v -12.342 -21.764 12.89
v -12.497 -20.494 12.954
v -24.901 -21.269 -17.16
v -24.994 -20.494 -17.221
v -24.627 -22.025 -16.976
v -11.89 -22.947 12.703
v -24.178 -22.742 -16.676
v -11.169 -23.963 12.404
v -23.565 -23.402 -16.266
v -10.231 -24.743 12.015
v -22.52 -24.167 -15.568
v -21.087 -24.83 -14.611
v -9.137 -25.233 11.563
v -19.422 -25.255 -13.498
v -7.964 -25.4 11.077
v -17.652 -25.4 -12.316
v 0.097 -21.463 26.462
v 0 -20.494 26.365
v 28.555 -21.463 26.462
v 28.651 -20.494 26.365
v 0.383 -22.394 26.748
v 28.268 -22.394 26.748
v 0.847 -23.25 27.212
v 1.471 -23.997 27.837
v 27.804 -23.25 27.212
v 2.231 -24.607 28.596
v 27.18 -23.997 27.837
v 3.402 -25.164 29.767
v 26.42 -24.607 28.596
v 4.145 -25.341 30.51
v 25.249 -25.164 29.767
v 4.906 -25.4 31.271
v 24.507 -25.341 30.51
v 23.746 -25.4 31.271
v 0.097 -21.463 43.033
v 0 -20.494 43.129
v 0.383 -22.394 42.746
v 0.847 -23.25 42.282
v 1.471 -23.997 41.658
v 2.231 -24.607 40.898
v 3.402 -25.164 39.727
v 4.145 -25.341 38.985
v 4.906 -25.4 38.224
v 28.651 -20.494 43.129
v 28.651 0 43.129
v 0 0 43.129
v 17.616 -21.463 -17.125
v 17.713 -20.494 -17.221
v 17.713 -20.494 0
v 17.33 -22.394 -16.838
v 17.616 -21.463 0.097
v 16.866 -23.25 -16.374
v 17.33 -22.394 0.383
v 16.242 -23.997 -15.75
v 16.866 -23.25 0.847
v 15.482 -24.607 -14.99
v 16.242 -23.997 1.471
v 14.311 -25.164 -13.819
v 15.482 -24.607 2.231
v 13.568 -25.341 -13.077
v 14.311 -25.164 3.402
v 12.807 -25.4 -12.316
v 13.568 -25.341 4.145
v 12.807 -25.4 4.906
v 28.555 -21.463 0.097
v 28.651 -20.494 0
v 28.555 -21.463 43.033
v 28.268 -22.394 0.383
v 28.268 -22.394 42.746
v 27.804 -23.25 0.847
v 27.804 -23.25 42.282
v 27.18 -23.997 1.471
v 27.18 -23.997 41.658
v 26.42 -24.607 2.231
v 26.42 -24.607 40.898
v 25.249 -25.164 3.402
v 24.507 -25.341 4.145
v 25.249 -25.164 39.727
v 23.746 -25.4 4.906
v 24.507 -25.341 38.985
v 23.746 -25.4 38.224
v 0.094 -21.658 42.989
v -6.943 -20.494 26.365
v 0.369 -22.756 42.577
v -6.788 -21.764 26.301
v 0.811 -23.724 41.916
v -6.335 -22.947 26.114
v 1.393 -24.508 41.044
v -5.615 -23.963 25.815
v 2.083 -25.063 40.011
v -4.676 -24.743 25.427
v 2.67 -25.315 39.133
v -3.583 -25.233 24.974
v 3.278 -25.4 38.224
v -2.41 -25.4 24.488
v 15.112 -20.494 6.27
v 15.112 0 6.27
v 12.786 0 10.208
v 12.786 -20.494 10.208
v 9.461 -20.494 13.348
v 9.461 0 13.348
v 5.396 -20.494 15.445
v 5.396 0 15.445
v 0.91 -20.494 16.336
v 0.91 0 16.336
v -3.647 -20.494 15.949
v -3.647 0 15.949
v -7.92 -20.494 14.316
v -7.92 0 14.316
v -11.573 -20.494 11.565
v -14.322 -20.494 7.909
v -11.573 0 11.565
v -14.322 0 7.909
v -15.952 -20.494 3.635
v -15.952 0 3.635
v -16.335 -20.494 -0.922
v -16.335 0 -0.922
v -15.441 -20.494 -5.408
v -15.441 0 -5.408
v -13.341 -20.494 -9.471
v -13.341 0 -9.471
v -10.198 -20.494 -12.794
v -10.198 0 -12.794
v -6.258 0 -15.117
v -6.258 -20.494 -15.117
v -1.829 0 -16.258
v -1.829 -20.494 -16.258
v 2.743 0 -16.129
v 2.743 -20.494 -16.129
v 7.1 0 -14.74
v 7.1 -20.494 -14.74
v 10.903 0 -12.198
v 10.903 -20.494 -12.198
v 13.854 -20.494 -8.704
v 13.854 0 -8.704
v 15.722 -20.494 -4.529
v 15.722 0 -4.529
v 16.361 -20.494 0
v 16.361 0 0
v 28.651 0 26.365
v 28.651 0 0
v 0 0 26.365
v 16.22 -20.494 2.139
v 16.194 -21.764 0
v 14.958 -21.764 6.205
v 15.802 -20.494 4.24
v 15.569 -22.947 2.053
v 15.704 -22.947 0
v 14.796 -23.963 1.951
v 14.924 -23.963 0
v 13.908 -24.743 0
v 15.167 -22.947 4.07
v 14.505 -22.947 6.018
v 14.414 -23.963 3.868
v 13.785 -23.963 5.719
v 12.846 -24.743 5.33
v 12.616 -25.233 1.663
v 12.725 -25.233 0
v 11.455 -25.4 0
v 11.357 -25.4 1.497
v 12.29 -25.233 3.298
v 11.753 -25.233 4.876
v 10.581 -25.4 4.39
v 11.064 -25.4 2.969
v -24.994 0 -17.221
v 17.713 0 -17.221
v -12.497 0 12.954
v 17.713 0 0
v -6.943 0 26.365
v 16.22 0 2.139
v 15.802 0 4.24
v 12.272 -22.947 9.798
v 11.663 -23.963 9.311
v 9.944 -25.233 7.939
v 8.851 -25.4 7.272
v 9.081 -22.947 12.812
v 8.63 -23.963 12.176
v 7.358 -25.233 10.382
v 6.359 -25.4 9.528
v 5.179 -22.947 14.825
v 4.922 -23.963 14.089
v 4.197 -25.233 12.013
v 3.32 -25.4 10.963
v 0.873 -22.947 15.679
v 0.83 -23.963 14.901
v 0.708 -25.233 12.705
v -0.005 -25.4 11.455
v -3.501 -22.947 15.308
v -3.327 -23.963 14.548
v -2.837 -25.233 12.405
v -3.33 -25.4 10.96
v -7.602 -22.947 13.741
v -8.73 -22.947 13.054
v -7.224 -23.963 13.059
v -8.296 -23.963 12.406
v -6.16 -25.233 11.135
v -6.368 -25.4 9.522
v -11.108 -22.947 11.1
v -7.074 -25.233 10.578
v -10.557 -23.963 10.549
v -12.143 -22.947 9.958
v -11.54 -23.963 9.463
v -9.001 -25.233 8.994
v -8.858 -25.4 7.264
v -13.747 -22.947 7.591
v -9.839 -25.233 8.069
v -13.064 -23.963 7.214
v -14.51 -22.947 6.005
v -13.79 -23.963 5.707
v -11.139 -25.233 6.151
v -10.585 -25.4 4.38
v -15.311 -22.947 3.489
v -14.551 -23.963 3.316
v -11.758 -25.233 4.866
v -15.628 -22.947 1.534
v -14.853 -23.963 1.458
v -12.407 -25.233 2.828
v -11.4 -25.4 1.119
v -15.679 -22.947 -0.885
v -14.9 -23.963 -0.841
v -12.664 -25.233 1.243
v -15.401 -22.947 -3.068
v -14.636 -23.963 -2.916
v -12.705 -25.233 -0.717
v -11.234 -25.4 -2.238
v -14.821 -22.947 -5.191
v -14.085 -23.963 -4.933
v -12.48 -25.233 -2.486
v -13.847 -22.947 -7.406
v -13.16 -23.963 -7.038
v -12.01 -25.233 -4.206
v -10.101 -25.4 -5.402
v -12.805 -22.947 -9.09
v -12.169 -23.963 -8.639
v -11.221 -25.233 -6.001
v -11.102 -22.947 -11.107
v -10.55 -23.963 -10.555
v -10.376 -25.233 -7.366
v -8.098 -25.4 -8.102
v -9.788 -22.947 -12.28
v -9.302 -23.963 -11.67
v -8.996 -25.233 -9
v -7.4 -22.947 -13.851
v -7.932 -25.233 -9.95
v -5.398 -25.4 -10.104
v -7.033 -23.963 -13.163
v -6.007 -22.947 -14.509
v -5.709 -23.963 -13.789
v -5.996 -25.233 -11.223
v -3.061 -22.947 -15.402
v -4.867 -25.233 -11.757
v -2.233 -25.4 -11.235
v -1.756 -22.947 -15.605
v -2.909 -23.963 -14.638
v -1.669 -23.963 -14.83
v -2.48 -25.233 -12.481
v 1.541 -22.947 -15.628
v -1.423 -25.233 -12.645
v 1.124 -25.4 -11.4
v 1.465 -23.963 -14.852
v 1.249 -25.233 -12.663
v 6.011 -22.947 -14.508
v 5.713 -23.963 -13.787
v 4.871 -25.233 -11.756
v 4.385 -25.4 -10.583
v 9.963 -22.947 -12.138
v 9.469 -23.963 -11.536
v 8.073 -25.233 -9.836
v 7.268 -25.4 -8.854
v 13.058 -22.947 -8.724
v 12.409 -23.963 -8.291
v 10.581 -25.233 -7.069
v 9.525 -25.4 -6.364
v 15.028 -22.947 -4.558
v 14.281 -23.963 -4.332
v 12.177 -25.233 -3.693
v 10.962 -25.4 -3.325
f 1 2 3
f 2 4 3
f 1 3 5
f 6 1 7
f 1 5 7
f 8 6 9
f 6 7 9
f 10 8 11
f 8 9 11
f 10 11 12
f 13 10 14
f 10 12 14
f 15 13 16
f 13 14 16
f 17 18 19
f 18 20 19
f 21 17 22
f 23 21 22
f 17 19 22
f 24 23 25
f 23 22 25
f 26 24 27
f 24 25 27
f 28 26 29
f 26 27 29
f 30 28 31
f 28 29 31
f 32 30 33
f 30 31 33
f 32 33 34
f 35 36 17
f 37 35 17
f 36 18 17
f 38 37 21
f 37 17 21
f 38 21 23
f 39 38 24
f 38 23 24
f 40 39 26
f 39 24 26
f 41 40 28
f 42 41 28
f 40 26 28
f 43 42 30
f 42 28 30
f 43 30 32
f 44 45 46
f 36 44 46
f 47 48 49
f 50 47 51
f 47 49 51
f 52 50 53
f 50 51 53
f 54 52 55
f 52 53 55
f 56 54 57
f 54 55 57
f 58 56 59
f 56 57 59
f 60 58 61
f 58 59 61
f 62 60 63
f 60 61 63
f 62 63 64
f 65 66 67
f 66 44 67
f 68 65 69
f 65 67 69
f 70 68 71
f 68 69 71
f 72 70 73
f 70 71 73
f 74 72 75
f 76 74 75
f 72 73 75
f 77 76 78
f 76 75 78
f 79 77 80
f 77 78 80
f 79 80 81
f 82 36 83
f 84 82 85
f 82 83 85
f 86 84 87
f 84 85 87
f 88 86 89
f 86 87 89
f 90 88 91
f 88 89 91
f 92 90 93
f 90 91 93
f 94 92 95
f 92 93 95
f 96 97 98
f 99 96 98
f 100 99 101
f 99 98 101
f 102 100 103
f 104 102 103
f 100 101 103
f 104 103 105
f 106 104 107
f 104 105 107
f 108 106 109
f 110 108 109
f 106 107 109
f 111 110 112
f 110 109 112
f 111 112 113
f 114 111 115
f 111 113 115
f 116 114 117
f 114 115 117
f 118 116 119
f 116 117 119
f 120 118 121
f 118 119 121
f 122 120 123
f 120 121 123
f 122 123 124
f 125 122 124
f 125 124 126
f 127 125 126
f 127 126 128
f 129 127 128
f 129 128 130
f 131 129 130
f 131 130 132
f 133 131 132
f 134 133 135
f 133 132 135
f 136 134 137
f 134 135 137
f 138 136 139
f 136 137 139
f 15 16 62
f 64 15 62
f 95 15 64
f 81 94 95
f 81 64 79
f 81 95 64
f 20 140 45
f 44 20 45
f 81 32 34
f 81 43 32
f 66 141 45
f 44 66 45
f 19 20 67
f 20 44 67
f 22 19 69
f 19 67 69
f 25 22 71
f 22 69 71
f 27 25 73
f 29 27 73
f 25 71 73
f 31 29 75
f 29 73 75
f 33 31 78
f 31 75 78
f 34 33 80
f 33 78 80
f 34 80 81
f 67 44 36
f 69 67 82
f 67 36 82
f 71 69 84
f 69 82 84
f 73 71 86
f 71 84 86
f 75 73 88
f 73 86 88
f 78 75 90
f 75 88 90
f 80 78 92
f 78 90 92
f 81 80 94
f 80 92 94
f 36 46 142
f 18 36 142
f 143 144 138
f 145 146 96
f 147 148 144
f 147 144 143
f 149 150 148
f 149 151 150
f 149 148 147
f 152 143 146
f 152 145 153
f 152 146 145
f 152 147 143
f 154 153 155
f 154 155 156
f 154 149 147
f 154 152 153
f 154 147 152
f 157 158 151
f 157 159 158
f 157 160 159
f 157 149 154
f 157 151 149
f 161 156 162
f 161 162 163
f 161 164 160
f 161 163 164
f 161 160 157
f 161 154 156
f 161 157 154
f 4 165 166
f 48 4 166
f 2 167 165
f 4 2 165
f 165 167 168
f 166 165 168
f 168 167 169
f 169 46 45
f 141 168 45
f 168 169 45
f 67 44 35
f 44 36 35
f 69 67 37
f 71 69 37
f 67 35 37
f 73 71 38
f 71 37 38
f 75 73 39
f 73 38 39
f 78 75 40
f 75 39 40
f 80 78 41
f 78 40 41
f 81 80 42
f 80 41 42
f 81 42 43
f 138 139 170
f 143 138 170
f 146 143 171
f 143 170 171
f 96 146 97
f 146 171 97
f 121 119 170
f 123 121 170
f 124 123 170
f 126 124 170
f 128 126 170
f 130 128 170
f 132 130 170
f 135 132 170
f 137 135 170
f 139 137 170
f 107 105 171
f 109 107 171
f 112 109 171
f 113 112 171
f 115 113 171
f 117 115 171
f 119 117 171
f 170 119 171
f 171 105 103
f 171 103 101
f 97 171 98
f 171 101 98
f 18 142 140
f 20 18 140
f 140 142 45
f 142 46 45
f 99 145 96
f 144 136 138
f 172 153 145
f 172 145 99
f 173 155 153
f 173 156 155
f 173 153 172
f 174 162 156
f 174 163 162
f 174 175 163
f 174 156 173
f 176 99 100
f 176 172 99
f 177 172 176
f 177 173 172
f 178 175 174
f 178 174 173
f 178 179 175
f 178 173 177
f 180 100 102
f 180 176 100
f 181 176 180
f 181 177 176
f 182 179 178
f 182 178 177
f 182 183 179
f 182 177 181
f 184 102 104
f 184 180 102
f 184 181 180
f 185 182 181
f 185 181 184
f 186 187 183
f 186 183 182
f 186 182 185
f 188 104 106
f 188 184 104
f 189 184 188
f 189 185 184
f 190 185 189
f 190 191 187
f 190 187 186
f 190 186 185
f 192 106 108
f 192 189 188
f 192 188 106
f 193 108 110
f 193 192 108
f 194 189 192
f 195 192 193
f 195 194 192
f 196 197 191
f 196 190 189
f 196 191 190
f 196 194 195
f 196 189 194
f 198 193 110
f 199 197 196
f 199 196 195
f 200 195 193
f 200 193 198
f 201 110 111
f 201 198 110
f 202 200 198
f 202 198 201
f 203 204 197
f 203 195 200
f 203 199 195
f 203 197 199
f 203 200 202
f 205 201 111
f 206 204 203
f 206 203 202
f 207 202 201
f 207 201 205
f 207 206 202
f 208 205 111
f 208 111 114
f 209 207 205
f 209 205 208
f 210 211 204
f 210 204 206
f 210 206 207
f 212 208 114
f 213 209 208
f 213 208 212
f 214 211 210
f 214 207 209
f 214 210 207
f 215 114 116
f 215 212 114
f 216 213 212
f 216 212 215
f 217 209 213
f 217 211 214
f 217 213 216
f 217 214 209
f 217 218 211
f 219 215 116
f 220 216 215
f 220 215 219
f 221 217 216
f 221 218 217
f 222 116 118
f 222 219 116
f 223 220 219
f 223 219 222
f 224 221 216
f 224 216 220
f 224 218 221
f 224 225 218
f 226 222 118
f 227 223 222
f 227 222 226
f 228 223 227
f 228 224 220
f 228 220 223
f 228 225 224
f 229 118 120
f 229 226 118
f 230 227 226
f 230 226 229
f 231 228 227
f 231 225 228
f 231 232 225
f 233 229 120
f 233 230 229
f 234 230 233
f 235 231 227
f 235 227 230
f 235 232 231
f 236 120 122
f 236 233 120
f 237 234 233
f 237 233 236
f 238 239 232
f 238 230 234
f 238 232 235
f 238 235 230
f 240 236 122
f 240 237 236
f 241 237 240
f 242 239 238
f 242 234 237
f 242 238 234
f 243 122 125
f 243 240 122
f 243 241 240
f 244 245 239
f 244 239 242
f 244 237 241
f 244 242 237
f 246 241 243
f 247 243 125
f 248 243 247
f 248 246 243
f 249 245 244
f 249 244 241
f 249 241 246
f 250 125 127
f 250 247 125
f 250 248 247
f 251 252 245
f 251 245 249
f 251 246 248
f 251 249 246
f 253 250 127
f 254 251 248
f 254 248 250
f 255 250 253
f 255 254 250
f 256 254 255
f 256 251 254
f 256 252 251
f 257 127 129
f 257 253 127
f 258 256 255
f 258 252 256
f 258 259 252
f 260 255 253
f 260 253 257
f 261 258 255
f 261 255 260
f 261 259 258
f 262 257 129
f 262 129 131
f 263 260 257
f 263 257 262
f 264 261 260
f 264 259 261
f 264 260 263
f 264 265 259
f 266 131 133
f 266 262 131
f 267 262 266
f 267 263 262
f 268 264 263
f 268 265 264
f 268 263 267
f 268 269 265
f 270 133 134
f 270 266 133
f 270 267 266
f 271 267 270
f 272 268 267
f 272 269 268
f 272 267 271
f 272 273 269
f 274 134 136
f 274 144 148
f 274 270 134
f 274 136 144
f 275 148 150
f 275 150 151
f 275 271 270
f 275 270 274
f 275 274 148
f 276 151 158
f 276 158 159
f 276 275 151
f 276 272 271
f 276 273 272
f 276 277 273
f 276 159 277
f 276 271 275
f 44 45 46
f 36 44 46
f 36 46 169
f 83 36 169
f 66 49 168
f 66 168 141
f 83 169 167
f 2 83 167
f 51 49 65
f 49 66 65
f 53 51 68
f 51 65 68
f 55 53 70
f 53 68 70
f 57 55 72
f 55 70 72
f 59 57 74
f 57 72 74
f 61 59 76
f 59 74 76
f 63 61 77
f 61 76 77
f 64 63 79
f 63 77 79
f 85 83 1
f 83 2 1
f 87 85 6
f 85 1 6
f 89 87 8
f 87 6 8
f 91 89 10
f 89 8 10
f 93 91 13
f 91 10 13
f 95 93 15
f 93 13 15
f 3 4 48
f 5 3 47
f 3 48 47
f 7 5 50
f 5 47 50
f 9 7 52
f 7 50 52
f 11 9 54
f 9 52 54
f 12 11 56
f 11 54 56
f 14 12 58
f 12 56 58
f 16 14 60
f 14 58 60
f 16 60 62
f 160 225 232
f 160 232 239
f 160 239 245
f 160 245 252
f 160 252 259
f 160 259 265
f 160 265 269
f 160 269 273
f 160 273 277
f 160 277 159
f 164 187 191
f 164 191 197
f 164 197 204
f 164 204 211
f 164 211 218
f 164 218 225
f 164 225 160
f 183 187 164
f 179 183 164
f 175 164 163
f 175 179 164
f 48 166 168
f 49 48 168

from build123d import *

# Parameters (mm, degrees)
F1_DEPTH = 25.4
F2_DEPTH = 25.4
F3_R     = 4.9056819587
F3_2_R   = 4.9056819587
F3_3_R   = 4.9056819587


with BuildPart() as f1:
    # F0 (on Front) → F1 (new body)
    with BuildSketch(Plane.XZ):
        Polygon((0, 26.3652000576), (6.7747447512, 26.3652000576), (28.6512039602, 26.3652000576), (28.6512039602, 43.1291982532), (0, 43.1291982532), (0, 34.7471991554), align=None)
    extrude(amount=F1_DEPTH)

    # F3
    f3_edges = [f1.edges().sort_by_distance(p)[0] for p in [
        (14.325602, -25.4, 26.3652),
        (28.651204, -25.4, 34.747199),
        (0, -25.4, 34.747199),
        (14.325602, -25.4, 43.129198),
    ]]
    fillet(f3_edges, radius=F3_R)


with BuildPart() as f1b:
    # F0 (on Front) → F1, piece 2 (new body)
    with BuildSketch(Plane.XZ):
        with BuildLine():
            ThreePointArc((16.3608330212, 0), (16.0455644423, 3.1963602544), (15.1119089765, 6.2695346107))
            ThreePointArc((15.1119089765, 6.2695346107), (-16.0455644423, -3.1963602544), (16.3608330212, 0))
        make_face()
    extrude(amount=F1_DEPTH)

    # F3#2
    f3_2_edges = [f1b.edges().sort_by_distance(p)[0] for p in [
        (-16.360833, -25.4, 0),
    ]]
    fillet(f3_2_edges, radius=F3_2_R)


with BuildPart() as f2:
    # F0 (on Front) → F2 (new body)
    with BuildSketch(Plane.XZ):
        Polygon((0, 26.3652000576), (6.7747447512, 26.3652000576), (28.6512039602, 26.3652000576), (28.6512039602, 43.1291982532), (0, 43.1291982532), (0, 34.7471991554), align=None)
        Polygon((0, 43.1291982532), (-6.9426662852, 26.3652000576), (0, 26.3652000576), (0, 34.7471991554), align=None)
        Polygon((-6.9426662852, 26.3652000576), (-12.4968001619, 12.9539994523), (6.7747447512, 26.3652000576), (0, 26.3652000576), align=None)
        Polygon((15.1119089765, 6.2695346107), (17.7129743557, 0), (28.6512039602, 26.3652000576), (6.7747447512, 26.3652000576), align=None)
        Polygon((28.6512039602, 26.3652000576), (17.7129743557, 0), (28.6512039602, 0), align=None)
        Polygon((-12.4968001619, 12.9539994523), (-24.9936003238, -17.2211993486), (17.7129743557, -17.2211993486), (17.7129743557, 0), (15.1119089765, 6.2695346107), (6.7747447512, 26.3652000576), align=None)
        with BuildLine():
            ThreePointArc((16.3608330212, 0), (-16.0455644423, -3.1963602544), (15.1119089765, 6.2695346107))
            ThreePointArc((15.1119089765, 6.2695346107), (16.0455644423, 3.1963602544), (16.3608330212, 0))
        make_face(mode=Mode.SUBTRACT)
        with BuildLine():
            ThreePointArc((16.3608330212, 0), (16.0455644423, 3.1963602544), (15.1119089765, 6.2695346107))
            ThreePointArc((15.1119089765, 6.2695346107), (-16.0455644423, -3.1963602544), (16.3608330212, 0))
        make_face()
    extrude(amount=F2_DEPTH)

    # F3#3
    f3_3_edges = [f2.edges().sort_by_distance(p)[0] for p in [
        (14.325602, -25.4, 43.129198),
        (-12.4968, -25.4, 12.953999),
        (-3.640313, -25.4, -17.221199),
        (17.712974, -25.4, -8.6106),
        (23.182089, -25.4, 0),
        (28.651204, -25.4, 21.564599),
    ]]
    fillet(f3_3_edges, radius=F3_3_R)


solid = Compound([f1.part, f1b.part, f2.part])
